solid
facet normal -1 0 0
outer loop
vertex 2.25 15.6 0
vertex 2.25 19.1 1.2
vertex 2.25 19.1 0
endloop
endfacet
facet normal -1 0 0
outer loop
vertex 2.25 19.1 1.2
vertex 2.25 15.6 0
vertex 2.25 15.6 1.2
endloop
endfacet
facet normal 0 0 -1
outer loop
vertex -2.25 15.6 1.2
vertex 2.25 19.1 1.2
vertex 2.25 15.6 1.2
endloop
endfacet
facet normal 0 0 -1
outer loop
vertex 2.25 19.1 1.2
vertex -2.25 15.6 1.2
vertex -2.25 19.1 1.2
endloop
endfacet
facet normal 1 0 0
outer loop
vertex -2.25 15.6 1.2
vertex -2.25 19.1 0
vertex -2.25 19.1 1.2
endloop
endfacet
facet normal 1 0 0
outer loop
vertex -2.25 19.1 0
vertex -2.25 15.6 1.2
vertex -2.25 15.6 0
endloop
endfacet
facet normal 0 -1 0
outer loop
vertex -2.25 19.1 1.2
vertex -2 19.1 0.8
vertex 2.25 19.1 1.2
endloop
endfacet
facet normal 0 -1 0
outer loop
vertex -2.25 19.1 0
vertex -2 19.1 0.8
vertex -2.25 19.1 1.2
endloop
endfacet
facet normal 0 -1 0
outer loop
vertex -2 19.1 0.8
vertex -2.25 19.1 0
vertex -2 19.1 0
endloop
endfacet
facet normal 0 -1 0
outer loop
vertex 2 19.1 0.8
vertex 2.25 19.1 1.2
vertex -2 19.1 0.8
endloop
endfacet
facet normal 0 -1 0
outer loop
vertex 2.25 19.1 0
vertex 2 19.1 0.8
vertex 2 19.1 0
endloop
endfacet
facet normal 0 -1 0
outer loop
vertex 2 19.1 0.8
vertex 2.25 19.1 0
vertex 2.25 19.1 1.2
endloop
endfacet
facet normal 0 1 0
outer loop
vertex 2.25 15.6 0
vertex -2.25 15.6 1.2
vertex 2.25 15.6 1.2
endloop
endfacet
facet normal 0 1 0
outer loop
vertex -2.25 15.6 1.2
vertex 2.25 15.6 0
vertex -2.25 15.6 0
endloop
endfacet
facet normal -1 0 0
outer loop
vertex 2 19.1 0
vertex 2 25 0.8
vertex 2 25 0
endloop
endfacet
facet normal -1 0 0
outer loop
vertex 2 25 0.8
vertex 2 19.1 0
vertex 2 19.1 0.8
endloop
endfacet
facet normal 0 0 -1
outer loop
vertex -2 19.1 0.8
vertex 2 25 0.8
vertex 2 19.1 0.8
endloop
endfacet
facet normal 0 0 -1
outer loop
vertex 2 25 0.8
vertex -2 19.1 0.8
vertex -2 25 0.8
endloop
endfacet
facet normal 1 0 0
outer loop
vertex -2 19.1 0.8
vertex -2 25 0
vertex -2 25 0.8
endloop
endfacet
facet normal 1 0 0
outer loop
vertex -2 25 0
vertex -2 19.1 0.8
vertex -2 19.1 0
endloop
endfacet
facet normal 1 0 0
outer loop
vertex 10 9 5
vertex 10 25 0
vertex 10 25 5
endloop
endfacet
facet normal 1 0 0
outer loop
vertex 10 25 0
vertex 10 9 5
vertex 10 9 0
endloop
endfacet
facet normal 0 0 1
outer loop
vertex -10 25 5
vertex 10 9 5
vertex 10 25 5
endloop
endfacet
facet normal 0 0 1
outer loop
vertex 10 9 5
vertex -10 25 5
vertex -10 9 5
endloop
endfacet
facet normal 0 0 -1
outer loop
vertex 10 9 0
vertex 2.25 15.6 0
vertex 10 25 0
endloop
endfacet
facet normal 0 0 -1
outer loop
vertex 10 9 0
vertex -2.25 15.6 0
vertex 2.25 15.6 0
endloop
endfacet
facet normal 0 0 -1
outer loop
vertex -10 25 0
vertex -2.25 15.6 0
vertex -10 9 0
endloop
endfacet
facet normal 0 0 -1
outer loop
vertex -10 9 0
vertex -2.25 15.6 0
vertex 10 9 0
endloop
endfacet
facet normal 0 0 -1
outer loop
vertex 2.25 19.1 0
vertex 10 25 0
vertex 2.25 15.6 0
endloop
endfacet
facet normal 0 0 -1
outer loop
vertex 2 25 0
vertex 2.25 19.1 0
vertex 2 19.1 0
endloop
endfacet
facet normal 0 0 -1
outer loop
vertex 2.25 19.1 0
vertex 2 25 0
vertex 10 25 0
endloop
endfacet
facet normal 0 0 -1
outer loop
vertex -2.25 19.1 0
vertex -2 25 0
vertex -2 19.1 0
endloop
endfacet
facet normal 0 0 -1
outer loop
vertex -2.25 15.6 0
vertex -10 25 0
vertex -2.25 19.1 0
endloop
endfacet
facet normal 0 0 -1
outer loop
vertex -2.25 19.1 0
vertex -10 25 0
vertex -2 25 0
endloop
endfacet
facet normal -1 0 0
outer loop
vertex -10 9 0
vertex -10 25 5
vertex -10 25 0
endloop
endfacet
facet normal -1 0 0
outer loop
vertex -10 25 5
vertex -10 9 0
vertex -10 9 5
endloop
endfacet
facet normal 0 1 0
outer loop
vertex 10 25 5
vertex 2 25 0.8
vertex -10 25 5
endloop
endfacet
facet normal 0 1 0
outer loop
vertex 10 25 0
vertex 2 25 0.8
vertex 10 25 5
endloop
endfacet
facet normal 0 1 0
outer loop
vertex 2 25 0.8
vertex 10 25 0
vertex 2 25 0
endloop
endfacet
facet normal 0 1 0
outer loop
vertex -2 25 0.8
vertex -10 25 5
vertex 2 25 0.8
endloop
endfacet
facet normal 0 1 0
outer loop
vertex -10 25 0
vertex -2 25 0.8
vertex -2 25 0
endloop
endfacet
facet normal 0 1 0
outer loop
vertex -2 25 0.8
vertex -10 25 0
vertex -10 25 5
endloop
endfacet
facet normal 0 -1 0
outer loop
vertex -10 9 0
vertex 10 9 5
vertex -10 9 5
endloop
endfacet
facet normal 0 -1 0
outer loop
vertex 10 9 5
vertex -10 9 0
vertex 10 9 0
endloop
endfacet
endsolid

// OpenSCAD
// file: stack_options.scad
// =========================================================
// BRAILLIX COORDINATED STACK OPTIONS
//
// Default exports remain the audited legacy stack. Render the non-destructive
// shaft-preserving candidate with:
//
//   openscad -D stack_repair_raise=4 ...
//
// The 4 mm value is not arbitrary. With the motor mounting face at world z=41,
// the measured Ø9 x 2 mm collar ends at z=43. A 4 mm cam hub seated on that
// collar puts the cam underside at z=47 and its flat surface at z=49: exactly
// 4 mm above the legacy cam-flat datum. Base standoffs, top plate, cell shell,
// and pod therefore move together by the same amount.
//
// This is a candidate until the real cam/linkage/spring and Hall tests pass.
// =========================================================

stack_repair_raise = is_undef(stack_repair_raise) ? 0 : stack_repair_raise;

assert(stack_repair_raise == 0 || stack_repair_raise == 4,
       "stack_repair_raise must be 0 (legacy audit) or 4 (Option A candidate)");

stack_option_a = stack_repair_raise == 4;
// file: hall_interface.scad
// Candidate Hall interface: retained underside mount, explicit roof and gap.
include <mech_layout.scad>
assert(stack_repair_raise == 0, "Candidate only supports the default motor stack");
hall_body_w=4.1; hall_body_d=3.1; hall_body_t=1.6;
hall_fit=0.4; hall_floor_t=0.4; hall_air_gap=0.4;
hall_wire_w=4; hall_wire_d=0.8;
hall_pocket_x=homing_mag_r*cos(homing_mag_angle);
hall_pocket_y=homing_mag_r*sin(homing_mag_angle);
// 5 - 3.4 pocket - 0.4 roof = 1.2mm recess; body projects below base.
hall_underhang=0.5; // 0.4 body projection + 0.1 assembly allowance
function hall_island_height(repair_raise,plate_thickness)=0;
function hall_pocket_height(repair_raise,plate_thickness)=
    plate_thickness-cam_pocket_depth-hall_floor_t;
module hall_sensor_island(repair_raise,plate_thickness) {}
module hall_sensor_pocket(repair_raise,plate_thickness,plate_width) {
    depth=hall_pocket_height(repair_raise,plate_thickness);
    assert(depth>0 && plate_thickness-cam_pocket_depth-depth>=0.399);
    translate([hall_pocket_x-(hall_body_w+hall_fit)/2,
               hall_pocket_y-(hall_body_d+hall_fit)/2,-0.1])
        cube([hall_body_w+hall_fit,hall_body_d+hall_fit,depth+0.1]);
    translate([-hall_wire_w/2,hall_pocket_y,-0.1])
        cube([hall_wire_w,plate_width/2-hall_pocket_y+1,hall_wire_d+0.1]);
}
// main file
/*
  Exact Option-A Hall-island section coupon

  This is cut directly from the production base_plate() module so the underside
  sensor tunnel, 0.4 mm roof, 0.7 mm island, wire channel, and print orientation
  cannot drift. Print flat in PETG with no supports. Fit the bare Hall body, route
  its three leads, and verify switching with the intended 8x1 mm magnet before
  releasing the full base.

  MAGNET: 8x1mm, not the 3x1mm this file used to name. 3mm discs could not be
  sourced and the only 3mm stock is 3x3, which fails the cam's own assert
  (magnet_depth < disk_base_thickness - 0.5). See homing_mag_dia in
  mech_layout.scad, which is where the number actually lives.

  SENSOR: a bare A3144 unipolar digital switch in TO-92, NOT the analog MH
  module. This is forced, not preferred - a multi-cell chain reads the hall
  through the cell's own MCP23017 expander, and an expander has no ADC. The
  A3144 body is 4.1 x 3.0 x 1.5mm and the pocket is 4.5 x 3.5, so no CAD change
  was needed for the swap.

  WHAT THIS COUPON MUST NOW PROVE: that the 8mm magnet switches the A3144
  cleanly through the 0.4mm roof and 0.5mm air gap, and - because the magnet
  spans 4.7 cam states - that ONE EDGE of the field is repeatable when the cam
  always approaches from the same direction. Peak detection is meaningless at
  this magnet size.
*/

include <hall_interface.scad>

coupon_w = 20;
coupon_y0 = 9;
coupon_depth = 16;
plate_t = 5;

intersection() {
    difference() {
        union() {
            translate([-coupon_w/2, coupon_y0, 0])
                cube([coupon_w, coupon_depth, plate_t]);
            hall_sensor_island(4, plate_t);
        }
        hall_sensor_pocket(4, plate_t, 50);
    }
    translate([-coupon_w/2, coupon_y0, -0.01])
        cube([coupon_w, coupon_depth + 0.1, 6.01]);
}
